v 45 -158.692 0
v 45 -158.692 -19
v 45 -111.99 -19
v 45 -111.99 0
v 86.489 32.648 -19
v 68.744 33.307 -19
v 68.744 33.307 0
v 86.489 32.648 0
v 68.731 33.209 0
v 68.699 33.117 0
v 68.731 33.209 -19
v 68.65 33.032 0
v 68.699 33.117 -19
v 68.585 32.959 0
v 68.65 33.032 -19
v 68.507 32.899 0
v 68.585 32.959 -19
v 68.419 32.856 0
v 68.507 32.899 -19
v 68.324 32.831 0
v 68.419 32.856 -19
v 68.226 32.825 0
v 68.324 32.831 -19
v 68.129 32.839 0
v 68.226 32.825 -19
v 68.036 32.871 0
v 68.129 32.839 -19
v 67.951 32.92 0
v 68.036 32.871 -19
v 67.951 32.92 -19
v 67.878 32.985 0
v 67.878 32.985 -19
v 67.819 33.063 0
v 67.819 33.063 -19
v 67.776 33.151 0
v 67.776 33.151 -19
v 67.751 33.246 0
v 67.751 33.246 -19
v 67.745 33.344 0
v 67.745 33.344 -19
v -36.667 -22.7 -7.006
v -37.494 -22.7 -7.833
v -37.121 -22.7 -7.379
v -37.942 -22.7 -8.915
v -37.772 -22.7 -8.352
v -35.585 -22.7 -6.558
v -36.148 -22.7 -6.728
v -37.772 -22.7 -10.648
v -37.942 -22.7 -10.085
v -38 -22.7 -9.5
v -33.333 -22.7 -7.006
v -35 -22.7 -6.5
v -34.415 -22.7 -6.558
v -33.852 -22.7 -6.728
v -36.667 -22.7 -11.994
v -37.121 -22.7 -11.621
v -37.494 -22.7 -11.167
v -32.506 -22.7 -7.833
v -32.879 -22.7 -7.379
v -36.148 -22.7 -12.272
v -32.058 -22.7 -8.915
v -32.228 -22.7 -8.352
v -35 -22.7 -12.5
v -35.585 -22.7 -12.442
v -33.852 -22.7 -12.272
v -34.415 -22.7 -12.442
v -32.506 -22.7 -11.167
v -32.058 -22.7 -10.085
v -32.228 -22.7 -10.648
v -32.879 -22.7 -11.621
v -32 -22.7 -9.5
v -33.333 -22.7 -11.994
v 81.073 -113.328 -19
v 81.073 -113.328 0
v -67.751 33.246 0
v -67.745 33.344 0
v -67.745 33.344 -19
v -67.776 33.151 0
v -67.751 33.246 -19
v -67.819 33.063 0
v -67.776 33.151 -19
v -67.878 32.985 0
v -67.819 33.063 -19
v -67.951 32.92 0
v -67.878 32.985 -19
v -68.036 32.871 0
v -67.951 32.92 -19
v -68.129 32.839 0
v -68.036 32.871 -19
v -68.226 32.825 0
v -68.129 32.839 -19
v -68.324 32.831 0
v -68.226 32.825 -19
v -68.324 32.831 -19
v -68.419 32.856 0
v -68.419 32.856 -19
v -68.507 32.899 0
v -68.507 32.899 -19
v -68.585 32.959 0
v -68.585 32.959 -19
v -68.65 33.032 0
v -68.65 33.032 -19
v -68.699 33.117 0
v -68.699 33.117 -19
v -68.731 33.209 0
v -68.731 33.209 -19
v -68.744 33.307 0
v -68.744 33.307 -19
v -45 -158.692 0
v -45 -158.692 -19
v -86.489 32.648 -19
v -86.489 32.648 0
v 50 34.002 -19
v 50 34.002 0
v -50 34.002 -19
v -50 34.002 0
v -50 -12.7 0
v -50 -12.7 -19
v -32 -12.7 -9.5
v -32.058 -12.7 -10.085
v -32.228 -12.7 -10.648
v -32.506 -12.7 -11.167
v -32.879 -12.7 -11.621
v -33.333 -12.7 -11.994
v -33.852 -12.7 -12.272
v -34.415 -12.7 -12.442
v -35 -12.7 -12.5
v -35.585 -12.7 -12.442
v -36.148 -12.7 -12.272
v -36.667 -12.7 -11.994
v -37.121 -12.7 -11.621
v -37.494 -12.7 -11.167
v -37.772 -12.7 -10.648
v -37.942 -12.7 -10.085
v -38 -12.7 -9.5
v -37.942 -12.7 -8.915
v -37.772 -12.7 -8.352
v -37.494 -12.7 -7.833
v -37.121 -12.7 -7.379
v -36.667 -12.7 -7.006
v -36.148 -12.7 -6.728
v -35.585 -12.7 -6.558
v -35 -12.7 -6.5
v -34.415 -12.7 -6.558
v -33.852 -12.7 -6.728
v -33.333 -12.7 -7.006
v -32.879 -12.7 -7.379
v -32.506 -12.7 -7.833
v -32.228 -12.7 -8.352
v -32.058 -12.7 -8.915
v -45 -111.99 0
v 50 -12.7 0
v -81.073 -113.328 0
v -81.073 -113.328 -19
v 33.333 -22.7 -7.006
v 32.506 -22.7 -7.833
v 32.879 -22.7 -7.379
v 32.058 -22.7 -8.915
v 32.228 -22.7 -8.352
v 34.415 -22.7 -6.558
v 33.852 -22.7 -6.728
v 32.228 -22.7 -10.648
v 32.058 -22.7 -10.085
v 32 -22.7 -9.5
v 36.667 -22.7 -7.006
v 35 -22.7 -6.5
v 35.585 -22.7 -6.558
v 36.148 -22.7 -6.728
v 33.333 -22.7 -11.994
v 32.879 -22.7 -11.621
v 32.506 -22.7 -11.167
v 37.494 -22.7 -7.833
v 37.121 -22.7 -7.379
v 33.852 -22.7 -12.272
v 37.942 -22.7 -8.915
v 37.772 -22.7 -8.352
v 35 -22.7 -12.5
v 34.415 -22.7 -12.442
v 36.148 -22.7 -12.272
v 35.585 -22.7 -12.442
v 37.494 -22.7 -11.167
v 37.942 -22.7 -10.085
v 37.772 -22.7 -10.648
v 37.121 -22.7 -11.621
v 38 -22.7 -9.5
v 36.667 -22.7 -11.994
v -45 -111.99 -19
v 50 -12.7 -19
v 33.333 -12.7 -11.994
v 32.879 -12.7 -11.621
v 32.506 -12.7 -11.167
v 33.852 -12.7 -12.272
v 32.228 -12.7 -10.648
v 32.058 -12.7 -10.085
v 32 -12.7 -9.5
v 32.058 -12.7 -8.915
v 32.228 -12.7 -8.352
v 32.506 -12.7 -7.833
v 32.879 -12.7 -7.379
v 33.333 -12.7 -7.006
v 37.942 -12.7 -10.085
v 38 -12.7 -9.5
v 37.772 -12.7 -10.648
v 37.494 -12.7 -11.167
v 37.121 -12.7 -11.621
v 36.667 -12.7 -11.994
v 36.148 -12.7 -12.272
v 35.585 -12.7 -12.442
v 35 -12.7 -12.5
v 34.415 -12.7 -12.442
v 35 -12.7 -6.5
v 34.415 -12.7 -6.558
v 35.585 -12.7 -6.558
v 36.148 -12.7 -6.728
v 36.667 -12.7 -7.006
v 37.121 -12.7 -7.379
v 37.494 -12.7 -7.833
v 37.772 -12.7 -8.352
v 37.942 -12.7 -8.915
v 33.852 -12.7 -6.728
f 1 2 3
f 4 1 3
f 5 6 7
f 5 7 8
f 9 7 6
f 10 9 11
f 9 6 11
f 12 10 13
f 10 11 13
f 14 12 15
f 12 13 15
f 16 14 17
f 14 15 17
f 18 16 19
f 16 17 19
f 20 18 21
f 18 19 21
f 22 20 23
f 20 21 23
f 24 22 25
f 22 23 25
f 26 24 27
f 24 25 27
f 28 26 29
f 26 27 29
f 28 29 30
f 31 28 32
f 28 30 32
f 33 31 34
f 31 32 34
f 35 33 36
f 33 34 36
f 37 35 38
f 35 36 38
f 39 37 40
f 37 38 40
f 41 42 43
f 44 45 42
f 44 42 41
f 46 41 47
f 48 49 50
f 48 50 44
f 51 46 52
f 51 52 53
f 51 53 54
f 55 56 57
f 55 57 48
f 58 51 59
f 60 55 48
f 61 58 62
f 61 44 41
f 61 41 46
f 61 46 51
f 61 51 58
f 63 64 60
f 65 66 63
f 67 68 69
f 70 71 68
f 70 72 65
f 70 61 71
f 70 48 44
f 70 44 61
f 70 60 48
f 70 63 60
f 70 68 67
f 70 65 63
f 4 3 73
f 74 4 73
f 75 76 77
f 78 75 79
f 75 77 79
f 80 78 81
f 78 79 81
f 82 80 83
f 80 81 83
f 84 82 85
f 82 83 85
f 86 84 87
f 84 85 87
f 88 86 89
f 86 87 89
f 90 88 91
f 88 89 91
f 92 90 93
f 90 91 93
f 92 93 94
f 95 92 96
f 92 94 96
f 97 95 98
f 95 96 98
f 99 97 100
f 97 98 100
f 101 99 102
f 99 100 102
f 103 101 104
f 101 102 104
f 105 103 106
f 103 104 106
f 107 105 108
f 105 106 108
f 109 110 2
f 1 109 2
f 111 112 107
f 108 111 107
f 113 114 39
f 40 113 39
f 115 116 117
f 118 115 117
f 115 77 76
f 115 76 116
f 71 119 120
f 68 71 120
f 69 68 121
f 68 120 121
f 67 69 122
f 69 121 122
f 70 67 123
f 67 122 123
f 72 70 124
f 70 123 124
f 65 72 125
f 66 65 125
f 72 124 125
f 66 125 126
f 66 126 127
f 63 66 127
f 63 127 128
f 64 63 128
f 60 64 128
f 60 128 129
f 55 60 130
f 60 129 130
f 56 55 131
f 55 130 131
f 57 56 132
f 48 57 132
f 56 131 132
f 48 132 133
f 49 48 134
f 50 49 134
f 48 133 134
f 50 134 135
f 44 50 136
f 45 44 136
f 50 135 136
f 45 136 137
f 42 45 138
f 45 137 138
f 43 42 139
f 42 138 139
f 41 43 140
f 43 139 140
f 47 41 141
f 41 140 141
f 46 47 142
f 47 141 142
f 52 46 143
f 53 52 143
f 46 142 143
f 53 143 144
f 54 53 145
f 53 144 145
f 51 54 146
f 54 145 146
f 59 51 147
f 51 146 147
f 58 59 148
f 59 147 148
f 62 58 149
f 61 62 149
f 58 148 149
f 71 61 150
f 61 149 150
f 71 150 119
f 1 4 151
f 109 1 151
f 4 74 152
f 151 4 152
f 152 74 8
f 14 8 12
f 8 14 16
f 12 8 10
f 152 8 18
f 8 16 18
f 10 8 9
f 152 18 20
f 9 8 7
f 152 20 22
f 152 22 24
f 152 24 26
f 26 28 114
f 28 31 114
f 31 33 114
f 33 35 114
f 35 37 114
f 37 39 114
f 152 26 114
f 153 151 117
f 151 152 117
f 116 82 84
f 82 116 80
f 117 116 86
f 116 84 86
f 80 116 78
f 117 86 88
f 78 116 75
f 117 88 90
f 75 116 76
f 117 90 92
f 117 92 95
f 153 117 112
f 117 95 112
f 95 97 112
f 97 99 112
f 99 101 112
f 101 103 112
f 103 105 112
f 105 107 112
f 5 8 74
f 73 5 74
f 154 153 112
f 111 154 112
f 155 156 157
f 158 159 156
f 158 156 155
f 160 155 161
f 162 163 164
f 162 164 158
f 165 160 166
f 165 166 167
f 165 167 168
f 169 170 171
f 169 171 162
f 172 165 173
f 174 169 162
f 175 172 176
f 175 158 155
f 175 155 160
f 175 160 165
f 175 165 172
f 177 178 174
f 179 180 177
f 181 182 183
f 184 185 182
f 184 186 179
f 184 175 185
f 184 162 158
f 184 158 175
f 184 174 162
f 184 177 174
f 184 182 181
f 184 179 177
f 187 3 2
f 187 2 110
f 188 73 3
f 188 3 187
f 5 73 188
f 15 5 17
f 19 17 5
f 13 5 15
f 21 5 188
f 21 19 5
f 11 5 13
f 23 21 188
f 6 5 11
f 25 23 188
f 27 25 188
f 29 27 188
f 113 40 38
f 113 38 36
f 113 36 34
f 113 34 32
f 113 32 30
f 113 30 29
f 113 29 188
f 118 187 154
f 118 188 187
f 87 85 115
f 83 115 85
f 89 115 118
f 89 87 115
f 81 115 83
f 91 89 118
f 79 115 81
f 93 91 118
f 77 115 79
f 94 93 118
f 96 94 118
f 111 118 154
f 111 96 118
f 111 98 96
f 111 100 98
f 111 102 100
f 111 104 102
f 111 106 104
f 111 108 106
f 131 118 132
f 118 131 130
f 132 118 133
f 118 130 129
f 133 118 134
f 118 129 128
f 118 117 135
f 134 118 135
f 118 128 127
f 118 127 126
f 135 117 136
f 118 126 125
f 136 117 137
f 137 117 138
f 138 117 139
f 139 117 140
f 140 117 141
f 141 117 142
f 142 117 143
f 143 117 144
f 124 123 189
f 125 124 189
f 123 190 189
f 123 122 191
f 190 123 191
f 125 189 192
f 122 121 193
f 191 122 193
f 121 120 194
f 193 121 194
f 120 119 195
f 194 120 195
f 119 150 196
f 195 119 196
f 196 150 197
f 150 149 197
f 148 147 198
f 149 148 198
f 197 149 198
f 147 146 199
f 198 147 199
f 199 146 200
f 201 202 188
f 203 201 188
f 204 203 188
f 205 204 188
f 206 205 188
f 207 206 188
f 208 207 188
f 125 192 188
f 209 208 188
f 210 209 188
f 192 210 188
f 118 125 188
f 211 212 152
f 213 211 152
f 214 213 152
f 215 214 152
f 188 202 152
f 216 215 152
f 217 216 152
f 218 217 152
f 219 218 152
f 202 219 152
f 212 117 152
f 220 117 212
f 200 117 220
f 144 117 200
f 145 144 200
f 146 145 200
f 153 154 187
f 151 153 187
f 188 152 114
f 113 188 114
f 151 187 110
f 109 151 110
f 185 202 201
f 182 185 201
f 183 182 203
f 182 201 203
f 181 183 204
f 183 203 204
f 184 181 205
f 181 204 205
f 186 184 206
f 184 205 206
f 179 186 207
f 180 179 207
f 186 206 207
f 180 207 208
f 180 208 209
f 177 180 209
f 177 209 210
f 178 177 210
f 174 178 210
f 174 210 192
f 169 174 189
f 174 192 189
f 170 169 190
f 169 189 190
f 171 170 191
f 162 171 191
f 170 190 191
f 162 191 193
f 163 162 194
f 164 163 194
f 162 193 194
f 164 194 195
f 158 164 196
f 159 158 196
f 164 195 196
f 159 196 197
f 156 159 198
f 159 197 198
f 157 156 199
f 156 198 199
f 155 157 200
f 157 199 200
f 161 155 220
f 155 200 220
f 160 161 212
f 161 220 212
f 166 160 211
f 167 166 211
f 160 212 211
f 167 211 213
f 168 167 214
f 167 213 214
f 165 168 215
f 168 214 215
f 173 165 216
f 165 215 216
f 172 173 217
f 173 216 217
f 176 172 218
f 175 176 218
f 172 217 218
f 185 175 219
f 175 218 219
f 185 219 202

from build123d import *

# Parameters (mm, degrees)
BOSS_EXTRUDE1_DEPTH = 19
CUT_EXTRUDE1_DEPTH  = 19
SKETCH6_R           = 3
CUT_EXTRUDE2_DEPTH  = 10
SKETCH7_R           = 0.5
CUT_EXTRUDE3_DEPTH  = 20


with BuildPart() as part:
    # Sketch2 → Boss-Extrude1 (new body)
    with BuildSketch(Plane.XY):
        Polygon((-50, -12.7), (50, -12.7), (50, 34.001988406), (86.488954477, 32.648136171), (79.389661188, -158.69164437), (-79.389661188, -158.69164437), (-86.488954477, 32.648136171), (-50, 34.001988406), align=None)
    extrude(amount=-BOSS_EXTRUDE1_DEPTH)

    # Sketch4 → Cut-Extrude1 (cut)
    with BuildSketch(Plane(origin=(0, 0, -19), x_dir=(-1, 0, 0), z_dir=(0, 0, -1))):
        Polygon((176.999986596, -116.887260719), (45, -111.989655964), (45, -158.69164437), (-45, -158.69164437), (-45, -111.989655964), (-160.814787096, -116.286740127), (-160.814787096, -226.328943165), (176.999986596, -226.328943165), align=None)
    extrude(amount=-CUT_EXTRUDE1_DEPTH, mode=Mode.SUBTRACT)

    # Sketch6 → Cut-Extrude2 (cut)
    with BuildSketch(Plane(origin=(0, -12.7, 0), x_dir=(1, 0, 0), z_dir=(0, 1, 0))):
        with Locations((35, 9.5)):
            Circle(SKETCH6_R)
        with Locations((-35, 9.5)):
            Circle(SKETCH6_R)
    extrude(amount=-CUT_EXTRUDE2_DEPTH, mode=Mode.SUBTRACT)

    # Sketch7 → Cut-Extrude3 (cut)
    with BuildSketch(Plane(origin=(0, 0, -19), x_dir=(-1, 0, 0), z_dir=(0, 0, -1))):
        with Locations((68.244477239, 33.325062289)):
            Circle(SKETCH7_R)
        with Locations((-68.244477239, 33.325062289)):
            Circle(SKETCH7_R)
    extrude(amount=-CUT_EXTRUDE3_DEPTH, mode=Mode.SUBTRACT)


solid = part.part
